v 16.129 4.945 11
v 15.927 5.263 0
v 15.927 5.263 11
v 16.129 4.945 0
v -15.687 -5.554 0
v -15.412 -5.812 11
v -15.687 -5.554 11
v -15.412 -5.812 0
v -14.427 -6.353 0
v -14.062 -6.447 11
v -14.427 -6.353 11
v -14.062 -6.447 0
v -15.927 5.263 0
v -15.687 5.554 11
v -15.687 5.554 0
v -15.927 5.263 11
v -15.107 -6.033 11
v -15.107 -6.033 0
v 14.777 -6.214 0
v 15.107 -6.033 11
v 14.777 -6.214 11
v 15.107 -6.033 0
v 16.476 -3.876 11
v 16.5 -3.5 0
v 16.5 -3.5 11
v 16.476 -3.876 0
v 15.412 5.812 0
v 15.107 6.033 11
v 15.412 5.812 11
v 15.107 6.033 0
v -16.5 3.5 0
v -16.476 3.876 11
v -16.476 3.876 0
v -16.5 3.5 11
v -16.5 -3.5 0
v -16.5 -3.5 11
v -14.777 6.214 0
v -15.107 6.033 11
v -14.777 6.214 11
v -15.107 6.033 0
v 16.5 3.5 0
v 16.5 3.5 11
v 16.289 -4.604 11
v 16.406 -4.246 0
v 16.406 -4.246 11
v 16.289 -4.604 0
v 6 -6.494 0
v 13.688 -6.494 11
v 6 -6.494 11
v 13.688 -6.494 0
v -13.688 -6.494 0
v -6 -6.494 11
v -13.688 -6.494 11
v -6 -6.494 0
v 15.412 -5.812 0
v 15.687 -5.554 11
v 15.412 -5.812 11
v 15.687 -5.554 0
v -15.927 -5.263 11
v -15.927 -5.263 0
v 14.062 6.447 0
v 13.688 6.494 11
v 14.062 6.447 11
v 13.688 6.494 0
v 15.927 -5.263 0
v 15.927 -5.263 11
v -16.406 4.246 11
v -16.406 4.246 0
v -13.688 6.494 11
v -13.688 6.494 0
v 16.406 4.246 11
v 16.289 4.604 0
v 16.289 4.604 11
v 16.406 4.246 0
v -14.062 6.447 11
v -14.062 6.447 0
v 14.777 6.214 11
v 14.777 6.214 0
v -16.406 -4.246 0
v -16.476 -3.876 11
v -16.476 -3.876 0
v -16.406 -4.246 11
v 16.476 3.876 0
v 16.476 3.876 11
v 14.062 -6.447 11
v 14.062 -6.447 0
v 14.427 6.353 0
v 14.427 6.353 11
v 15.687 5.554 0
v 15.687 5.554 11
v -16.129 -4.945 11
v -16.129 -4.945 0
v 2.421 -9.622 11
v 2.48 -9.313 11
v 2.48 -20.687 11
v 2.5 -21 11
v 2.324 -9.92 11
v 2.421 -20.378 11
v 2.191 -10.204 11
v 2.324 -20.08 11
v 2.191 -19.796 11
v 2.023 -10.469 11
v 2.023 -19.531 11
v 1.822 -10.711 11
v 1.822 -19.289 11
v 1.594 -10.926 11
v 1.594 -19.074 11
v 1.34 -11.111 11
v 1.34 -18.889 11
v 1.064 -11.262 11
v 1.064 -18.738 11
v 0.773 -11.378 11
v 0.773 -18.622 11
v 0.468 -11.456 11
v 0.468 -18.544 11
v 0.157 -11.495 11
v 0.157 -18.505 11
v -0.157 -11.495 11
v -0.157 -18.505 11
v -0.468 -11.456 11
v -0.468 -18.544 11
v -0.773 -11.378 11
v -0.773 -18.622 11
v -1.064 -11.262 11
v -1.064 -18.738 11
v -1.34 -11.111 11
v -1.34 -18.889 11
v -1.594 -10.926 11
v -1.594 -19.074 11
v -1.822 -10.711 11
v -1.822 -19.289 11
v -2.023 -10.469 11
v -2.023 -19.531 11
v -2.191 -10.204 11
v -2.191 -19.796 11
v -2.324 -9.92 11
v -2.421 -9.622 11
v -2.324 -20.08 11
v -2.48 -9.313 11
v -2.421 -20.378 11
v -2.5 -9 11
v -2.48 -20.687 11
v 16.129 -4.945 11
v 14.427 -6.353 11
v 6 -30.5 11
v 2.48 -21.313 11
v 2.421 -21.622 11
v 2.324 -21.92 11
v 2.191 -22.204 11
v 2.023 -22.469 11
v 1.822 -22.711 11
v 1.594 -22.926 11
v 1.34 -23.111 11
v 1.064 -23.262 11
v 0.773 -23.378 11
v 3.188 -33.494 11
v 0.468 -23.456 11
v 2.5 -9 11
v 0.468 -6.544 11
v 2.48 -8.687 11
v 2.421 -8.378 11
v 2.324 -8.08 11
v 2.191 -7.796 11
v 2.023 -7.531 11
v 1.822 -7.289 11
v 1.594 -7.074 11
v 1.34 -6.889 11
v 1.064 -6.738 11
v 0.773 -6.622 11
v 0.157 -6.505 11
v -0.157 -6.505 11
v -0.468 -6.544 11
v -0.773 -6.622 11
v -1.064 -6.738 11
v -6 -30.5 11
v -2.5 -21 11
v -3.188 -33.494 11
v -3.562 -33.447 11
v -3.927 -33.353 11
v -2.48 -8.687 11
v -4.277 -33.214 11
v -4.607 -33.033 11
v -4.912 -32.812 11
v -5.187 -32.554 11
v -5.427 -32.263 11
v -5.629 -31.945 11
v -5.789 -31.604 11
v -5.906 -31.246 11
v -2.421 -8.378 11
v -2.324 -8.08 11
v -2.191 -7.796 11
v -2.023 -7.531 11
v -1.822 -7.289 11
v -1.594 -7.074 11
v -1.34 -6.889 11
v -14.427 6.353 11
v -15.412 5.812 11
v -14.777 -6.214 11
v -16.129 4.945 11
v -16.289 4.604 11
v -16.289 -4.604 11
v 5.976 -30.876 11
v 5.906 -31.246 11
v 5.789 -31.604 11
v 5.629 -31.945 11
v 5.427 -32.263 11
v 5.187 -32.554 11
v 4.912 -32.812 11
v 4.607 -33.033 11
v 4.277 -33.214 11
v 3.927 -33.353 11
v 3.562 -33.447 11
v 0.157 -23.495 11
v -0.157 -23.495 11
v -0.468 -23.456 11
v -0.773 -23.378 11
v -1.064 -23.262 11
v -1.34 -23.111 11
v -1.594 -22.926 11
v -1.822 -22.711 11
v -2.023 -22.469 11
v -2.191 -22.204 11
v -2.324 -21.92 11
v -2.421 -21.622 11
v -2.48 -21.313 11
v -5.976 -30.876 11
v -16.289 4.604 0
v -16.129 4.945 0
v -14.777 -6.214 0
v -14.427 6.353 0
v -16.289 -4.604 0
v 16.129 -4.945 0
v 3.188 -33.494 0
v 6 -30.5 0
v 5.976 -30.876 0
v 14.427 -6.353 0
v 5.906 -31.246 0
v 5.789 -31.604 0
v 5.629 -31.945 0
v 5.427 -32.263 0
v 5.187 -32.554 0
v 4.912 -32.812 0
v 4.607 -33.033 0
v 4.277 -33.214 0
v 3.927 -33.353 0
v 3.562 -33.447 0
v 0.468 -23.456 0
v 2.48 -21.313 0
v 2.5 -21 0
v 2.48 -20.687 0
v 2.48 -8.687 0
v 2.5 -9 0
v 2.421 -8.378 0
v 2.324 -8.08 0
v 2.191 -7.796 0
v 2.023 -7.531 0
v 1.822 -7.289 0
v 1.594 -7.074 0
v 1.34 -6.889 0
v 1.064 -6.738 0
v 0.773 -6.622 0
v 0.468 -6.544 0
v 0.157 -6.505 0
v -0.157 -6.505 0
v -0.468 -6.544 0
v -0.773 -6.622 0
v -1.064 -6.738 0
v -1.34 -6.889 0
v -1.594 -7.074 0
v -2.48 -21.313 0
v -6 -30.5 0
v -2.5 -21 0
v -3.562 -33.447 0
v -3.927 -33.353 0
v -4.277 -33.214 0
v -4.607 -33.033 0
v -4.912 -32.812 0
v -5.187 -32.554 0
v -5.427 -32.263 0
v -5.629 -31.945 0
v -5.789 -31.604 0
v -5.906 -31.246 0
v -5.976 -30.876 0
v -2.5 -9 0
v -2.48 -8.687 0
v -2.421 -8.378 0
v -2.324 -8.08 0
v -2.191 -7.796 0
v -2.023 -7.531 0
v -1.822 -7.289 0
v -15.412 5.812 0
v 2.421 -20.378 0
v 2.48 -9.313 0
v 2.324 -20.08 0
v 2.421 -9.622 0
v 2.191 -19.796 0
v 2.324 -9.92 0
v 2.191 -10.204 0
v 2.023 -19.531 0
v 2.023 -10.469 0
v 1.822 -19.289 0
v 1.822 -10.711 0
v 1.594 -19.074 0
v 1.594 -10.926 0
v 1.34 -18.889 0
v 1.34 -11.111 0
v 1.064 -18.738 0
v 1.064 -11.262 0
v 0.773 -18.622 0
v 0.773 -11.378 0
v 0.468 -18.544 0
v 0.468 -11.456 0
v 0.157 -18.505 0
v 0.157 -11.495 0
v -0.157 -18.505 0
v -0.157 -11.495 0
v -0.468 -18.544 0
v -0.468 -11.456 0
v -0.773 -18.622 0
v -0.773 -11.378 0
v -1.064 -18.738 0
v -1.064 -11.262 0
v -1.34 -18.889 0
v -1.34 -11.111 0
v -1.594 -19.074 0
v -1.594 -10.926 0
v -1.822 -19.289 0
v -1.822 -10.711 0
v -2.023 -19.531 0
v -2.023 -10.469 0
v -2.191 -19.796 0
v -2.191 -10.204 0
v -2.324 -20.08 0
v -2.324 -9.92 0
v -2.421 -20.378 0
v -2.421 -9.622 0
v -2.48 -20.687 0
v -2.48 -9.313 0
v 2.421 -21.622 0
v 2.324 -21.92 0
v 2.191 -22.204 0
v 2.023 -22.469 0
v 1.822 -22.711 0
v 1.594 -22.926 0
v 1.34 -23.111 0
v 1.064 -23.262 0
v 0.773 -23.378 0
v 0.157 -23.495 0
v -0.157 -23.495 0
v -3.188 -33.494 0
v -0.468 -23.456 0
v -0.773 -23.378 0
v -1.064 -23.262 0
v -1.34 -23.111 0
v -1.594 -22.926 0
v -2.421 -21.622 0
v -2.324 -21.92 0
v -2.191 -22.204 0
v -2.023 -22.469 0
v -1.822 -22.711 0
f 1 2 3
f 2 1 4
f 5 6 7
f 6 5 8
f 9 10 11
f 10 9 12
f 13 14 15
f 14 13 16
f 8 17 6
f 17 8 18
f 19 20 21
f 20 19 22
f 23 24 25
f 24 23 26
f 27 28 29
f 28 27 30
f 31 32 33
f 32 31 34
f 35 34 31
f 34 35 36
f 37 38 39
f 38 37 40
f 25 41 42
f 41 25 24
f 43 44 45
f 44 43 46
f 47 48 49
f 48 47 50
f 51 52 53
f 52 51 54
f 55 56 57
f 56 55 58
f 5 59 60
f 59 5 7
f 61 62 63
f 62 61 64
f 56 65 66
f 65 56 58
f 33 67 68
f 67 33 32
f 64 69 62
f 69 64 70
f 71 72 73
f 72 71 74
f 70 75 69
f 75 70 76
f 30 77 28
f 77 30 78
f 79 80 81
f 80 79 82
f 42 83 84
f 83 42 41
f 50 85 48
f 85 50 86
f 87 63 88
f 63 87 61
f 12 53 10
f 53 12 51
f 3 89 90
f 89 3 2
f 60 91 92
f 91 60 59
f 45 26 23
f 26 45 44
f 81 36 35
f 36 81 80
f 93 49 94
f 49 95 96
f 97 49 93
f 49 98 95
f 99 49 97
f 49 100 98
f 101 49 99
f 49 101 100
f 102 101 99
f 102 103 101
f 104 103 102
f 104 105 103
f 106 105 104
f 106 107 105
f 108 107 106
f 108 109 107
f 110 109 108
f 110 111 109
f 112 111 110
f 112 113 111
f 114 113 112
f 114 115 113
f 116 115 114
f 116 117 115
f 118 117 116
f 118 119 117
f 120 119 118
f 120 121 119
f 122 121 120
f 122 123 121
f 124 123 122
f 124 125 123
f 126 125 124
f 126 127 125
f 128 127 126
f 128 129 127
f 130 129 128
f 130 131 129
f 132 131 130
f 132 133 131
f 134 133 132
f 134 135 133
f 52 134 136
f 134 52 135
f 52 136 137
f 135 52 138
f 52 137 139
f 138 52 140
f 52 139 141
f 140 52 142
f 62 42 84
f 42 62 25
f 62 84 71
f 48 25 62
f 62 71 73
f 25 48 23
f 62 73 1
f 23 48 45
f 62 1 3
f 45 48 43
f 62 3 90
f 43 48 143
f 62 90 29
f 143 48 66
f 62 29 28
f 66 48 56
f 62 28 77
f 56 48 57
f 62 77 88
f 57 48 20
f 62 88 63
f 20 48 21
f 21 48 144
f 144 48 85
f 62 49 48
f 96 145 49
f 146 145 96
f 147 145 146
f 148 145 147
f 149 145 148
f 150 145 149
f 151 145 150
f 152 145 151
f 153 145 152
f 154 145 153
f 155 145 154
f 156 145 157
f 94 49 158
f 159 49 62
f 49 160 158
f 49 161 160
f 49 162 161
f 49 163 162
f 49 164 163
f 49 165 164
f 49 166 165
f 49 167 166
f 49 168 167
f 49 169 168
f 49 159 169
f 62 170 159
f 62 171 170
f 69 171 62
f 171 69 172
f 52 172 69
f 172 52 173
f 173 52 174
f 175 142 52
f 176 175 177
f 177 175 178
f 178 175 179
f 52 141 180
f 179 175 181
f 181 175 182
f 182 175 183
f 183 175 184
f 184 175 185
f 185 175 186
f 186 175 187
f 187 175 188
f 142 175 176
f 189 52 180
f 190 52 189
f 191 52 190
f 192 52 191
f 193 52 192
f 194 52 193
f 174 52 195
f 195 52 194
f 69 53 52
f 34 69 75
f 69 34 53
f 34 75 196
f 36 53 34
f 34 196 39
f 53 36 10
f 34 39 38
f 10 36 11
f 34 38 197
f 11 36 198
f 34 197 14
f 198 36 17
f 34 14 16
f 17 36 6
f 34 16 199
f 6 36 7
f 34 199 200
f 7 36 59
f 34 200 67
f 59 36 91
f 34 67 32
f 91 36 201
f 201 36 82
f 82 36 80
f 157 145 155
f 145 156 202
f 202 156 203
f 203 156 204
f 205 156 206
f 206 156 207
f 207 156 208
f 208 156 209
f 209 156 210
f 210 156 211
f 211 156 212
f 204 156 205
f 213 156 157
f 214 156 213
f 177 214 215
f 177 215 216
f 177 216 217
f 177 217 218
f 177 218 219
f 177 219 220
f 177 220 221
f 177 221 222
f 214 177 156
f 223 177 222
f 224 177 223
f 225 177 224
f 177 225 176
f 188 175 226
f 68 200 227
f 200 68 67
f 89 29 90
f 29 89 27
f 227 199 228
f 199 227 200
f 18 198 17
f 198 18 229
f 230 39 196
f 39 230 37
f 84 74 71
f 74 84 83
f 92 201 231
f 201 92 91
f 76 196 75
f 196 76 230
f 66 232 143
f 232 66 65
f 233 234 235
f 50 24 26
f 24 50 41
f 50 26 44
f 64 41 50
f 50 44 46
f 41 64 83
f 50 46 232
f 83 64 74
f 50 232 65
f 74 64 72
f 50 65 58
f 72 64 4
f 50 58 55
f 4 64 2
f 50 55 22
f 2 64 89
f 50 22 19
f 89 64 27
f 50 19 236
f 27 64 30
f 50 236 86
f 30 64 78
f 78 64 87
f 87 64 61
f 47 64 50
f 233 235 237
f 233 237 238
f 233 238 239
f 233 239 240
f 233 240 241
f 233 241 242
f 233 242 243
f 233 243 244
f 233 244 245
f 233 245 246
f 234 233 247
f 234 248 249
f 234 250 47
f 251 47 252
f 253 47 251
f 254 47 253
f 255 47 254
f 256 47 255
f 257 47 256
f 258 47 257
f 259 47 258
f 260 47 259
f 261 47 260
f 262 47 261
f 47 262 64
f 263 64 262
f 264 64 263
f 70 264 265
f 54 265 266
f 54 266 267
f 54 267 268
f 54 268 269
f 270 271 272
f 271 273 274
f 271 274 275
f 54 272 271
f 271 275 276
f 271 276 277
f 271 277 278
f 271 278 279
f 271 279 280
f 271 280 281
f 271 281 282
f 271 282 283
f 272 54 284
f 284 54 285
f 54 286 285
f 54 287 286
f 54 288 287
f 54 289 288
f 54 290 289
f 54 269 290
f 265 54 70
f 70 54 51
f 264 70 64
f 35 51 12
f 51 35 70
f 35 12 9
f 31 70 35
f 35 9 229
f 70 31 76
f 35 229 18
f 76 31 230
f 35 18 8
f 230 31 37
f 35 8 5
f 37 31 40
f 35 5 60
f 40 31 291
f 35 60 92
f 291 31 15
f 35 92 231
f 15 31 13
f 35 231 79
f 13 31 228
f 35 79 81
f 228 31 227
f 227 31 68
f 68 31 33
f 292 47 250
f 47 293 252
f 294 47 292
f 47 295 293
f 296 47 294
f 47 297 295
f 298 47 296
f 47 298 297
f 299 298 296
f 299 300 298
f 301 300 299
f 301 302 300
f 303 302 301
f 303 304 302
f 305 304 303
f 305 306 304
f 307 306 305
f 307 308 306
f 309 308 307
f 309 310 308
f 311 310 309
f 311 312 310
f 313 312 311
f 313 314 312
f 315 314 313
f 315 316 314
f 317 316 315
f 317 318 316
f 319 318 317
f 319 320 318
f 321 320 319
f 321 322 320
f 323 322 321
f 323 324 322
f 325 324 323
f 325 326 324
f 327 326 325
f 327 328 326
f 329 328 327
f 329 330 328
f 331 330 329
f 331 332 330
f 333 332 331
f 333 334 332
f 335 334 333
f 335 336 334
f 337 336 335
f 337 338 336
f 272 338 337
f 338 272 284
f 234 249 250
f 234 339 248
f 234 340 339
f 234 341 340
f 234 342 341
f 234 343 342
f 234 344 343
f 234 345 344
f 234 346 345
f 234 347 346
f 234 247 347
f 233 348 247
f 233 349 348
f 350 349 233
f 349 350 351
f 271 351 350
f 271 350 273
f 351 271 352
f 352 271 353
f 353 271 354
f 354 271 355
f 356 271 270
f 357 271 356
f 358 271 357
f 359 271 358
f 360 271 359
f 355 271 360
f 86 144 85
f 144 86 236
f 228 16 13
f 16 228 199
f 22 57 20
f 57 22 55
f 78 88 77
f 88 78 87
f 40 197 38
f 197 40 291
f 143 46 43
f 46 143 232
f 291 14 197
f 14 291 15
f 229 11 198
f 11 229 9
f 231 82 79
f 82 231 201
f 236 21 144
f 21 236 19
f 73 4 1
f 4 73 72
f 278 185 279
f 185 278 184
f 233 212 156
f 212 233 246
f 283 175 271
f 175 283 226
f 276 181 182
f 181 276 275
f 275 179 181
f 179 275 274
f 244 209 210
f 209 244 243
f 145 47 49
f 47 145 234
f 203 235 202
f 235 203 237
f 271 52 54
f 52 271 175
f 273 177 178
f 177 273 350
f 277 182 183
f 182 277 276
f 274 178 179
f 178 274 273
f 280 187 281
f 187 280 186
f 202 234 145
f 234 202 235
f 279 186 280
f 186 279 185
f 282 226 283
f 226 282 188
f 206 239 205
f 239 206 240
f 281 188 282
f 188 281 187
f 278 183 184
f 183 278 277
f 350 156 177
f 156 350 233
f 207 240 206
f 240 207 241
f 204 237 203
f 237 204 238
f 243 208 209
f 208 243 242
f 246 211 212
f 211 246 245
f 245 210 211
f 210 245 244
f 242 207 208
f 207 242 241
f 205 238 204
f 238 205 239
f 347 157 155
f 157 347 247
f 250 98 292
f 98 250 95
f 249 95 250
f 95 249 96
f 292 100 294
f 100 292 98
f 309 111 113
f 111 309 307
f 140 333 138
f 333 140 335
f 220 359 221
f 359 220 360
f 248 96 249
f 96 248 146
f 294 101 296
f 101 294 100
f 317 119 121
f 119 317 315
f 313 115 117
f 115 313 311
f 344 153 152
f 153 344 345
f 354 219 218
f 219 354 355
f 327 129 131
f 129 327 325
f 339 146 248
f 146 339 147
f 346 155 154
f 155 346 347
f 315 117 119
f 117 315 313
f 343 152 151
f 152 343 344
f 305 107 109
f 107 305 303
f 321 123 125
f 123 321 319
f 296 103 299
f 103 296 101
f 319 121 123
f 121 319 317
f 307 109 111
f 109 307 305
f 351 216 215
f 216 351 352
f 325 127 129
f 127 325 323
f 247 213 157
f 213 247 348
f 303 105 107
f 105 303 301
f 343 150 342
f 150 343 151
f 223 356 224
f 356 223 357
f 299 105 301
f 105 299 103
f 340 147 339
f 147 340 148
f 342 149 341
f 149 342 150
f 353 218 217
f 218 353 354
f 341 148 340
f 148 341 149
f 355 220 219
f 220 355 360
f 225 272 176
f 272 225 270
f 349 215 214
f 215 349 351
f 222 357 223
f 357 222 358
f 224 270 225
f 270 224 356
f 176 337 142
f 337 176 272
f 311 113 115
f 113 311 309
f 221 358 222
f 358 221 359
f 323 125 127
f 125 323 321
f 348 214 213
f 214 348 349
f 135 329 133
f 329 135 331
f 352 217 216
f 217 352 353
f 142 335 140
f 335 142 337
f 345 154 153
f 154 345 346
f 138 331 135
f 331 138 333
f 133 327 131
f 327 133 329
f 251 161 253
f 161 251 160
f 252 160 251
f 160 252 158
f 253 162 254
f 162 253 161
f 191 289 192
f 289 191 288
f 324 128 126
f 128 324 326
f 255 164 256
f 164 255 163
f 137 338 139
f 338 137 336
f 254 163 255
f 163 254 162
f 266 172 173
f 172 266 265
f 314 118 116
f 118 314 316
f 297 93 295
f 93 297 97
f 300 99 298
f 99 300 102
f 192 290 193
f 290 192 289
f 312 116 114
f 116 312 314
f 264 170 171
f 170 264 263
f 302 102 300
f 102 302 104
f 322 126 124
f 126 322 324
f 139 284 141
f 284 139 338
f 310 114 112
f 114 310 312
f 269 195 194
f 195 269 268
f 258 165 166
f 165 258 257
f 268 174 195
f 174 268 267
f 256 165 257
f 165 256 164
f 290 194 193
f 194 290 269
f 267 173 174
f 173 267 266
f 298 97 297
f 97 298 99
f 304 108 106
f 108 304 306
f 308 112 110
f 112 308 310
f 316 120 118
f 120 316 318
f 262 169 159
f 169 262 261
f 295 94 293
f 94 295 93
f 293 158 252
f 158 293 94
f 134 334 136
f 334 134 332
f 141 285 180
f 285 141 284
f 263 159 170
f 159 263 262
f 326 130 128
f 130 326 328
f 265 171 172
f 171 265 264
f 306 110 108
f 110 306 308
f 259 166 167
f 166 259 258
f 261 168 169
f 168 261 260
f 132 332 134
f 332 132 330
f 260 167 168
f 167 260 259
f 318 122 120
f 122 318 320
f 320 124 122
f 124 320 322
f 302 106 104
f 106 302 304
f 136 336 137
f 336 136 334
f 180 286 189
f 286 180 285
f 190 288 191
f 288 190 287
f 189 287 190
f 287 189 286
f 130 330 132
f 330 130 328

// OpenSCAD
SLING_THICKNESS = 11;
SLOT_WIDTH = 13;
SLOT_THICKNESS = 12;
SLOT_LENGTH = 33;
SLOT_HEIGHT = 40;
CORNER_DIA = 6;

HOLE_SPACING = 12;
HOLE_DIA = 5;
HOLE_OFFSET = 5;

$fn = 50;

module mount_holes(width, length, thickness, dia) {
  for(i = [-1, 1]) {
    for(j = [-1, 1]) {
      translate([i * width/2, j * length/2, 0])
      cylinder(d = dia, h = thickness);
    }
  }
}
module rounded_rect(width, length, thickness, corner_dia) {
  hull() {
    mount_holes(width-corner_dia, length-corner_dia, thickness, corner_dia);
  }
}

module adapter() {
  difference() {
    union() {
      rounded_rect(SLOT_LENGTH, SLOT_WIDTH, SLING_THICKNESS, CORNER_DIA);
      translate([0, -(SLOT_HEIGHT - SLOT_WIDTH)/2, 0])
      rounded_rect(SLOT_THICKNESS, SLOT_HEIGHT, SLING_THICKNESS, CORNER_DIA);
    }

    #translate([0, -(SLOT_HEIGHT - SLOT_WIDTH)/2 - SLOT_WIDTH/2 + HOLE_OFFSET, 0])
    mount_holes(0, HOLE_SPACING, SLING_THICKNESS, HOLE_DIA);
  }
}

adapter();
